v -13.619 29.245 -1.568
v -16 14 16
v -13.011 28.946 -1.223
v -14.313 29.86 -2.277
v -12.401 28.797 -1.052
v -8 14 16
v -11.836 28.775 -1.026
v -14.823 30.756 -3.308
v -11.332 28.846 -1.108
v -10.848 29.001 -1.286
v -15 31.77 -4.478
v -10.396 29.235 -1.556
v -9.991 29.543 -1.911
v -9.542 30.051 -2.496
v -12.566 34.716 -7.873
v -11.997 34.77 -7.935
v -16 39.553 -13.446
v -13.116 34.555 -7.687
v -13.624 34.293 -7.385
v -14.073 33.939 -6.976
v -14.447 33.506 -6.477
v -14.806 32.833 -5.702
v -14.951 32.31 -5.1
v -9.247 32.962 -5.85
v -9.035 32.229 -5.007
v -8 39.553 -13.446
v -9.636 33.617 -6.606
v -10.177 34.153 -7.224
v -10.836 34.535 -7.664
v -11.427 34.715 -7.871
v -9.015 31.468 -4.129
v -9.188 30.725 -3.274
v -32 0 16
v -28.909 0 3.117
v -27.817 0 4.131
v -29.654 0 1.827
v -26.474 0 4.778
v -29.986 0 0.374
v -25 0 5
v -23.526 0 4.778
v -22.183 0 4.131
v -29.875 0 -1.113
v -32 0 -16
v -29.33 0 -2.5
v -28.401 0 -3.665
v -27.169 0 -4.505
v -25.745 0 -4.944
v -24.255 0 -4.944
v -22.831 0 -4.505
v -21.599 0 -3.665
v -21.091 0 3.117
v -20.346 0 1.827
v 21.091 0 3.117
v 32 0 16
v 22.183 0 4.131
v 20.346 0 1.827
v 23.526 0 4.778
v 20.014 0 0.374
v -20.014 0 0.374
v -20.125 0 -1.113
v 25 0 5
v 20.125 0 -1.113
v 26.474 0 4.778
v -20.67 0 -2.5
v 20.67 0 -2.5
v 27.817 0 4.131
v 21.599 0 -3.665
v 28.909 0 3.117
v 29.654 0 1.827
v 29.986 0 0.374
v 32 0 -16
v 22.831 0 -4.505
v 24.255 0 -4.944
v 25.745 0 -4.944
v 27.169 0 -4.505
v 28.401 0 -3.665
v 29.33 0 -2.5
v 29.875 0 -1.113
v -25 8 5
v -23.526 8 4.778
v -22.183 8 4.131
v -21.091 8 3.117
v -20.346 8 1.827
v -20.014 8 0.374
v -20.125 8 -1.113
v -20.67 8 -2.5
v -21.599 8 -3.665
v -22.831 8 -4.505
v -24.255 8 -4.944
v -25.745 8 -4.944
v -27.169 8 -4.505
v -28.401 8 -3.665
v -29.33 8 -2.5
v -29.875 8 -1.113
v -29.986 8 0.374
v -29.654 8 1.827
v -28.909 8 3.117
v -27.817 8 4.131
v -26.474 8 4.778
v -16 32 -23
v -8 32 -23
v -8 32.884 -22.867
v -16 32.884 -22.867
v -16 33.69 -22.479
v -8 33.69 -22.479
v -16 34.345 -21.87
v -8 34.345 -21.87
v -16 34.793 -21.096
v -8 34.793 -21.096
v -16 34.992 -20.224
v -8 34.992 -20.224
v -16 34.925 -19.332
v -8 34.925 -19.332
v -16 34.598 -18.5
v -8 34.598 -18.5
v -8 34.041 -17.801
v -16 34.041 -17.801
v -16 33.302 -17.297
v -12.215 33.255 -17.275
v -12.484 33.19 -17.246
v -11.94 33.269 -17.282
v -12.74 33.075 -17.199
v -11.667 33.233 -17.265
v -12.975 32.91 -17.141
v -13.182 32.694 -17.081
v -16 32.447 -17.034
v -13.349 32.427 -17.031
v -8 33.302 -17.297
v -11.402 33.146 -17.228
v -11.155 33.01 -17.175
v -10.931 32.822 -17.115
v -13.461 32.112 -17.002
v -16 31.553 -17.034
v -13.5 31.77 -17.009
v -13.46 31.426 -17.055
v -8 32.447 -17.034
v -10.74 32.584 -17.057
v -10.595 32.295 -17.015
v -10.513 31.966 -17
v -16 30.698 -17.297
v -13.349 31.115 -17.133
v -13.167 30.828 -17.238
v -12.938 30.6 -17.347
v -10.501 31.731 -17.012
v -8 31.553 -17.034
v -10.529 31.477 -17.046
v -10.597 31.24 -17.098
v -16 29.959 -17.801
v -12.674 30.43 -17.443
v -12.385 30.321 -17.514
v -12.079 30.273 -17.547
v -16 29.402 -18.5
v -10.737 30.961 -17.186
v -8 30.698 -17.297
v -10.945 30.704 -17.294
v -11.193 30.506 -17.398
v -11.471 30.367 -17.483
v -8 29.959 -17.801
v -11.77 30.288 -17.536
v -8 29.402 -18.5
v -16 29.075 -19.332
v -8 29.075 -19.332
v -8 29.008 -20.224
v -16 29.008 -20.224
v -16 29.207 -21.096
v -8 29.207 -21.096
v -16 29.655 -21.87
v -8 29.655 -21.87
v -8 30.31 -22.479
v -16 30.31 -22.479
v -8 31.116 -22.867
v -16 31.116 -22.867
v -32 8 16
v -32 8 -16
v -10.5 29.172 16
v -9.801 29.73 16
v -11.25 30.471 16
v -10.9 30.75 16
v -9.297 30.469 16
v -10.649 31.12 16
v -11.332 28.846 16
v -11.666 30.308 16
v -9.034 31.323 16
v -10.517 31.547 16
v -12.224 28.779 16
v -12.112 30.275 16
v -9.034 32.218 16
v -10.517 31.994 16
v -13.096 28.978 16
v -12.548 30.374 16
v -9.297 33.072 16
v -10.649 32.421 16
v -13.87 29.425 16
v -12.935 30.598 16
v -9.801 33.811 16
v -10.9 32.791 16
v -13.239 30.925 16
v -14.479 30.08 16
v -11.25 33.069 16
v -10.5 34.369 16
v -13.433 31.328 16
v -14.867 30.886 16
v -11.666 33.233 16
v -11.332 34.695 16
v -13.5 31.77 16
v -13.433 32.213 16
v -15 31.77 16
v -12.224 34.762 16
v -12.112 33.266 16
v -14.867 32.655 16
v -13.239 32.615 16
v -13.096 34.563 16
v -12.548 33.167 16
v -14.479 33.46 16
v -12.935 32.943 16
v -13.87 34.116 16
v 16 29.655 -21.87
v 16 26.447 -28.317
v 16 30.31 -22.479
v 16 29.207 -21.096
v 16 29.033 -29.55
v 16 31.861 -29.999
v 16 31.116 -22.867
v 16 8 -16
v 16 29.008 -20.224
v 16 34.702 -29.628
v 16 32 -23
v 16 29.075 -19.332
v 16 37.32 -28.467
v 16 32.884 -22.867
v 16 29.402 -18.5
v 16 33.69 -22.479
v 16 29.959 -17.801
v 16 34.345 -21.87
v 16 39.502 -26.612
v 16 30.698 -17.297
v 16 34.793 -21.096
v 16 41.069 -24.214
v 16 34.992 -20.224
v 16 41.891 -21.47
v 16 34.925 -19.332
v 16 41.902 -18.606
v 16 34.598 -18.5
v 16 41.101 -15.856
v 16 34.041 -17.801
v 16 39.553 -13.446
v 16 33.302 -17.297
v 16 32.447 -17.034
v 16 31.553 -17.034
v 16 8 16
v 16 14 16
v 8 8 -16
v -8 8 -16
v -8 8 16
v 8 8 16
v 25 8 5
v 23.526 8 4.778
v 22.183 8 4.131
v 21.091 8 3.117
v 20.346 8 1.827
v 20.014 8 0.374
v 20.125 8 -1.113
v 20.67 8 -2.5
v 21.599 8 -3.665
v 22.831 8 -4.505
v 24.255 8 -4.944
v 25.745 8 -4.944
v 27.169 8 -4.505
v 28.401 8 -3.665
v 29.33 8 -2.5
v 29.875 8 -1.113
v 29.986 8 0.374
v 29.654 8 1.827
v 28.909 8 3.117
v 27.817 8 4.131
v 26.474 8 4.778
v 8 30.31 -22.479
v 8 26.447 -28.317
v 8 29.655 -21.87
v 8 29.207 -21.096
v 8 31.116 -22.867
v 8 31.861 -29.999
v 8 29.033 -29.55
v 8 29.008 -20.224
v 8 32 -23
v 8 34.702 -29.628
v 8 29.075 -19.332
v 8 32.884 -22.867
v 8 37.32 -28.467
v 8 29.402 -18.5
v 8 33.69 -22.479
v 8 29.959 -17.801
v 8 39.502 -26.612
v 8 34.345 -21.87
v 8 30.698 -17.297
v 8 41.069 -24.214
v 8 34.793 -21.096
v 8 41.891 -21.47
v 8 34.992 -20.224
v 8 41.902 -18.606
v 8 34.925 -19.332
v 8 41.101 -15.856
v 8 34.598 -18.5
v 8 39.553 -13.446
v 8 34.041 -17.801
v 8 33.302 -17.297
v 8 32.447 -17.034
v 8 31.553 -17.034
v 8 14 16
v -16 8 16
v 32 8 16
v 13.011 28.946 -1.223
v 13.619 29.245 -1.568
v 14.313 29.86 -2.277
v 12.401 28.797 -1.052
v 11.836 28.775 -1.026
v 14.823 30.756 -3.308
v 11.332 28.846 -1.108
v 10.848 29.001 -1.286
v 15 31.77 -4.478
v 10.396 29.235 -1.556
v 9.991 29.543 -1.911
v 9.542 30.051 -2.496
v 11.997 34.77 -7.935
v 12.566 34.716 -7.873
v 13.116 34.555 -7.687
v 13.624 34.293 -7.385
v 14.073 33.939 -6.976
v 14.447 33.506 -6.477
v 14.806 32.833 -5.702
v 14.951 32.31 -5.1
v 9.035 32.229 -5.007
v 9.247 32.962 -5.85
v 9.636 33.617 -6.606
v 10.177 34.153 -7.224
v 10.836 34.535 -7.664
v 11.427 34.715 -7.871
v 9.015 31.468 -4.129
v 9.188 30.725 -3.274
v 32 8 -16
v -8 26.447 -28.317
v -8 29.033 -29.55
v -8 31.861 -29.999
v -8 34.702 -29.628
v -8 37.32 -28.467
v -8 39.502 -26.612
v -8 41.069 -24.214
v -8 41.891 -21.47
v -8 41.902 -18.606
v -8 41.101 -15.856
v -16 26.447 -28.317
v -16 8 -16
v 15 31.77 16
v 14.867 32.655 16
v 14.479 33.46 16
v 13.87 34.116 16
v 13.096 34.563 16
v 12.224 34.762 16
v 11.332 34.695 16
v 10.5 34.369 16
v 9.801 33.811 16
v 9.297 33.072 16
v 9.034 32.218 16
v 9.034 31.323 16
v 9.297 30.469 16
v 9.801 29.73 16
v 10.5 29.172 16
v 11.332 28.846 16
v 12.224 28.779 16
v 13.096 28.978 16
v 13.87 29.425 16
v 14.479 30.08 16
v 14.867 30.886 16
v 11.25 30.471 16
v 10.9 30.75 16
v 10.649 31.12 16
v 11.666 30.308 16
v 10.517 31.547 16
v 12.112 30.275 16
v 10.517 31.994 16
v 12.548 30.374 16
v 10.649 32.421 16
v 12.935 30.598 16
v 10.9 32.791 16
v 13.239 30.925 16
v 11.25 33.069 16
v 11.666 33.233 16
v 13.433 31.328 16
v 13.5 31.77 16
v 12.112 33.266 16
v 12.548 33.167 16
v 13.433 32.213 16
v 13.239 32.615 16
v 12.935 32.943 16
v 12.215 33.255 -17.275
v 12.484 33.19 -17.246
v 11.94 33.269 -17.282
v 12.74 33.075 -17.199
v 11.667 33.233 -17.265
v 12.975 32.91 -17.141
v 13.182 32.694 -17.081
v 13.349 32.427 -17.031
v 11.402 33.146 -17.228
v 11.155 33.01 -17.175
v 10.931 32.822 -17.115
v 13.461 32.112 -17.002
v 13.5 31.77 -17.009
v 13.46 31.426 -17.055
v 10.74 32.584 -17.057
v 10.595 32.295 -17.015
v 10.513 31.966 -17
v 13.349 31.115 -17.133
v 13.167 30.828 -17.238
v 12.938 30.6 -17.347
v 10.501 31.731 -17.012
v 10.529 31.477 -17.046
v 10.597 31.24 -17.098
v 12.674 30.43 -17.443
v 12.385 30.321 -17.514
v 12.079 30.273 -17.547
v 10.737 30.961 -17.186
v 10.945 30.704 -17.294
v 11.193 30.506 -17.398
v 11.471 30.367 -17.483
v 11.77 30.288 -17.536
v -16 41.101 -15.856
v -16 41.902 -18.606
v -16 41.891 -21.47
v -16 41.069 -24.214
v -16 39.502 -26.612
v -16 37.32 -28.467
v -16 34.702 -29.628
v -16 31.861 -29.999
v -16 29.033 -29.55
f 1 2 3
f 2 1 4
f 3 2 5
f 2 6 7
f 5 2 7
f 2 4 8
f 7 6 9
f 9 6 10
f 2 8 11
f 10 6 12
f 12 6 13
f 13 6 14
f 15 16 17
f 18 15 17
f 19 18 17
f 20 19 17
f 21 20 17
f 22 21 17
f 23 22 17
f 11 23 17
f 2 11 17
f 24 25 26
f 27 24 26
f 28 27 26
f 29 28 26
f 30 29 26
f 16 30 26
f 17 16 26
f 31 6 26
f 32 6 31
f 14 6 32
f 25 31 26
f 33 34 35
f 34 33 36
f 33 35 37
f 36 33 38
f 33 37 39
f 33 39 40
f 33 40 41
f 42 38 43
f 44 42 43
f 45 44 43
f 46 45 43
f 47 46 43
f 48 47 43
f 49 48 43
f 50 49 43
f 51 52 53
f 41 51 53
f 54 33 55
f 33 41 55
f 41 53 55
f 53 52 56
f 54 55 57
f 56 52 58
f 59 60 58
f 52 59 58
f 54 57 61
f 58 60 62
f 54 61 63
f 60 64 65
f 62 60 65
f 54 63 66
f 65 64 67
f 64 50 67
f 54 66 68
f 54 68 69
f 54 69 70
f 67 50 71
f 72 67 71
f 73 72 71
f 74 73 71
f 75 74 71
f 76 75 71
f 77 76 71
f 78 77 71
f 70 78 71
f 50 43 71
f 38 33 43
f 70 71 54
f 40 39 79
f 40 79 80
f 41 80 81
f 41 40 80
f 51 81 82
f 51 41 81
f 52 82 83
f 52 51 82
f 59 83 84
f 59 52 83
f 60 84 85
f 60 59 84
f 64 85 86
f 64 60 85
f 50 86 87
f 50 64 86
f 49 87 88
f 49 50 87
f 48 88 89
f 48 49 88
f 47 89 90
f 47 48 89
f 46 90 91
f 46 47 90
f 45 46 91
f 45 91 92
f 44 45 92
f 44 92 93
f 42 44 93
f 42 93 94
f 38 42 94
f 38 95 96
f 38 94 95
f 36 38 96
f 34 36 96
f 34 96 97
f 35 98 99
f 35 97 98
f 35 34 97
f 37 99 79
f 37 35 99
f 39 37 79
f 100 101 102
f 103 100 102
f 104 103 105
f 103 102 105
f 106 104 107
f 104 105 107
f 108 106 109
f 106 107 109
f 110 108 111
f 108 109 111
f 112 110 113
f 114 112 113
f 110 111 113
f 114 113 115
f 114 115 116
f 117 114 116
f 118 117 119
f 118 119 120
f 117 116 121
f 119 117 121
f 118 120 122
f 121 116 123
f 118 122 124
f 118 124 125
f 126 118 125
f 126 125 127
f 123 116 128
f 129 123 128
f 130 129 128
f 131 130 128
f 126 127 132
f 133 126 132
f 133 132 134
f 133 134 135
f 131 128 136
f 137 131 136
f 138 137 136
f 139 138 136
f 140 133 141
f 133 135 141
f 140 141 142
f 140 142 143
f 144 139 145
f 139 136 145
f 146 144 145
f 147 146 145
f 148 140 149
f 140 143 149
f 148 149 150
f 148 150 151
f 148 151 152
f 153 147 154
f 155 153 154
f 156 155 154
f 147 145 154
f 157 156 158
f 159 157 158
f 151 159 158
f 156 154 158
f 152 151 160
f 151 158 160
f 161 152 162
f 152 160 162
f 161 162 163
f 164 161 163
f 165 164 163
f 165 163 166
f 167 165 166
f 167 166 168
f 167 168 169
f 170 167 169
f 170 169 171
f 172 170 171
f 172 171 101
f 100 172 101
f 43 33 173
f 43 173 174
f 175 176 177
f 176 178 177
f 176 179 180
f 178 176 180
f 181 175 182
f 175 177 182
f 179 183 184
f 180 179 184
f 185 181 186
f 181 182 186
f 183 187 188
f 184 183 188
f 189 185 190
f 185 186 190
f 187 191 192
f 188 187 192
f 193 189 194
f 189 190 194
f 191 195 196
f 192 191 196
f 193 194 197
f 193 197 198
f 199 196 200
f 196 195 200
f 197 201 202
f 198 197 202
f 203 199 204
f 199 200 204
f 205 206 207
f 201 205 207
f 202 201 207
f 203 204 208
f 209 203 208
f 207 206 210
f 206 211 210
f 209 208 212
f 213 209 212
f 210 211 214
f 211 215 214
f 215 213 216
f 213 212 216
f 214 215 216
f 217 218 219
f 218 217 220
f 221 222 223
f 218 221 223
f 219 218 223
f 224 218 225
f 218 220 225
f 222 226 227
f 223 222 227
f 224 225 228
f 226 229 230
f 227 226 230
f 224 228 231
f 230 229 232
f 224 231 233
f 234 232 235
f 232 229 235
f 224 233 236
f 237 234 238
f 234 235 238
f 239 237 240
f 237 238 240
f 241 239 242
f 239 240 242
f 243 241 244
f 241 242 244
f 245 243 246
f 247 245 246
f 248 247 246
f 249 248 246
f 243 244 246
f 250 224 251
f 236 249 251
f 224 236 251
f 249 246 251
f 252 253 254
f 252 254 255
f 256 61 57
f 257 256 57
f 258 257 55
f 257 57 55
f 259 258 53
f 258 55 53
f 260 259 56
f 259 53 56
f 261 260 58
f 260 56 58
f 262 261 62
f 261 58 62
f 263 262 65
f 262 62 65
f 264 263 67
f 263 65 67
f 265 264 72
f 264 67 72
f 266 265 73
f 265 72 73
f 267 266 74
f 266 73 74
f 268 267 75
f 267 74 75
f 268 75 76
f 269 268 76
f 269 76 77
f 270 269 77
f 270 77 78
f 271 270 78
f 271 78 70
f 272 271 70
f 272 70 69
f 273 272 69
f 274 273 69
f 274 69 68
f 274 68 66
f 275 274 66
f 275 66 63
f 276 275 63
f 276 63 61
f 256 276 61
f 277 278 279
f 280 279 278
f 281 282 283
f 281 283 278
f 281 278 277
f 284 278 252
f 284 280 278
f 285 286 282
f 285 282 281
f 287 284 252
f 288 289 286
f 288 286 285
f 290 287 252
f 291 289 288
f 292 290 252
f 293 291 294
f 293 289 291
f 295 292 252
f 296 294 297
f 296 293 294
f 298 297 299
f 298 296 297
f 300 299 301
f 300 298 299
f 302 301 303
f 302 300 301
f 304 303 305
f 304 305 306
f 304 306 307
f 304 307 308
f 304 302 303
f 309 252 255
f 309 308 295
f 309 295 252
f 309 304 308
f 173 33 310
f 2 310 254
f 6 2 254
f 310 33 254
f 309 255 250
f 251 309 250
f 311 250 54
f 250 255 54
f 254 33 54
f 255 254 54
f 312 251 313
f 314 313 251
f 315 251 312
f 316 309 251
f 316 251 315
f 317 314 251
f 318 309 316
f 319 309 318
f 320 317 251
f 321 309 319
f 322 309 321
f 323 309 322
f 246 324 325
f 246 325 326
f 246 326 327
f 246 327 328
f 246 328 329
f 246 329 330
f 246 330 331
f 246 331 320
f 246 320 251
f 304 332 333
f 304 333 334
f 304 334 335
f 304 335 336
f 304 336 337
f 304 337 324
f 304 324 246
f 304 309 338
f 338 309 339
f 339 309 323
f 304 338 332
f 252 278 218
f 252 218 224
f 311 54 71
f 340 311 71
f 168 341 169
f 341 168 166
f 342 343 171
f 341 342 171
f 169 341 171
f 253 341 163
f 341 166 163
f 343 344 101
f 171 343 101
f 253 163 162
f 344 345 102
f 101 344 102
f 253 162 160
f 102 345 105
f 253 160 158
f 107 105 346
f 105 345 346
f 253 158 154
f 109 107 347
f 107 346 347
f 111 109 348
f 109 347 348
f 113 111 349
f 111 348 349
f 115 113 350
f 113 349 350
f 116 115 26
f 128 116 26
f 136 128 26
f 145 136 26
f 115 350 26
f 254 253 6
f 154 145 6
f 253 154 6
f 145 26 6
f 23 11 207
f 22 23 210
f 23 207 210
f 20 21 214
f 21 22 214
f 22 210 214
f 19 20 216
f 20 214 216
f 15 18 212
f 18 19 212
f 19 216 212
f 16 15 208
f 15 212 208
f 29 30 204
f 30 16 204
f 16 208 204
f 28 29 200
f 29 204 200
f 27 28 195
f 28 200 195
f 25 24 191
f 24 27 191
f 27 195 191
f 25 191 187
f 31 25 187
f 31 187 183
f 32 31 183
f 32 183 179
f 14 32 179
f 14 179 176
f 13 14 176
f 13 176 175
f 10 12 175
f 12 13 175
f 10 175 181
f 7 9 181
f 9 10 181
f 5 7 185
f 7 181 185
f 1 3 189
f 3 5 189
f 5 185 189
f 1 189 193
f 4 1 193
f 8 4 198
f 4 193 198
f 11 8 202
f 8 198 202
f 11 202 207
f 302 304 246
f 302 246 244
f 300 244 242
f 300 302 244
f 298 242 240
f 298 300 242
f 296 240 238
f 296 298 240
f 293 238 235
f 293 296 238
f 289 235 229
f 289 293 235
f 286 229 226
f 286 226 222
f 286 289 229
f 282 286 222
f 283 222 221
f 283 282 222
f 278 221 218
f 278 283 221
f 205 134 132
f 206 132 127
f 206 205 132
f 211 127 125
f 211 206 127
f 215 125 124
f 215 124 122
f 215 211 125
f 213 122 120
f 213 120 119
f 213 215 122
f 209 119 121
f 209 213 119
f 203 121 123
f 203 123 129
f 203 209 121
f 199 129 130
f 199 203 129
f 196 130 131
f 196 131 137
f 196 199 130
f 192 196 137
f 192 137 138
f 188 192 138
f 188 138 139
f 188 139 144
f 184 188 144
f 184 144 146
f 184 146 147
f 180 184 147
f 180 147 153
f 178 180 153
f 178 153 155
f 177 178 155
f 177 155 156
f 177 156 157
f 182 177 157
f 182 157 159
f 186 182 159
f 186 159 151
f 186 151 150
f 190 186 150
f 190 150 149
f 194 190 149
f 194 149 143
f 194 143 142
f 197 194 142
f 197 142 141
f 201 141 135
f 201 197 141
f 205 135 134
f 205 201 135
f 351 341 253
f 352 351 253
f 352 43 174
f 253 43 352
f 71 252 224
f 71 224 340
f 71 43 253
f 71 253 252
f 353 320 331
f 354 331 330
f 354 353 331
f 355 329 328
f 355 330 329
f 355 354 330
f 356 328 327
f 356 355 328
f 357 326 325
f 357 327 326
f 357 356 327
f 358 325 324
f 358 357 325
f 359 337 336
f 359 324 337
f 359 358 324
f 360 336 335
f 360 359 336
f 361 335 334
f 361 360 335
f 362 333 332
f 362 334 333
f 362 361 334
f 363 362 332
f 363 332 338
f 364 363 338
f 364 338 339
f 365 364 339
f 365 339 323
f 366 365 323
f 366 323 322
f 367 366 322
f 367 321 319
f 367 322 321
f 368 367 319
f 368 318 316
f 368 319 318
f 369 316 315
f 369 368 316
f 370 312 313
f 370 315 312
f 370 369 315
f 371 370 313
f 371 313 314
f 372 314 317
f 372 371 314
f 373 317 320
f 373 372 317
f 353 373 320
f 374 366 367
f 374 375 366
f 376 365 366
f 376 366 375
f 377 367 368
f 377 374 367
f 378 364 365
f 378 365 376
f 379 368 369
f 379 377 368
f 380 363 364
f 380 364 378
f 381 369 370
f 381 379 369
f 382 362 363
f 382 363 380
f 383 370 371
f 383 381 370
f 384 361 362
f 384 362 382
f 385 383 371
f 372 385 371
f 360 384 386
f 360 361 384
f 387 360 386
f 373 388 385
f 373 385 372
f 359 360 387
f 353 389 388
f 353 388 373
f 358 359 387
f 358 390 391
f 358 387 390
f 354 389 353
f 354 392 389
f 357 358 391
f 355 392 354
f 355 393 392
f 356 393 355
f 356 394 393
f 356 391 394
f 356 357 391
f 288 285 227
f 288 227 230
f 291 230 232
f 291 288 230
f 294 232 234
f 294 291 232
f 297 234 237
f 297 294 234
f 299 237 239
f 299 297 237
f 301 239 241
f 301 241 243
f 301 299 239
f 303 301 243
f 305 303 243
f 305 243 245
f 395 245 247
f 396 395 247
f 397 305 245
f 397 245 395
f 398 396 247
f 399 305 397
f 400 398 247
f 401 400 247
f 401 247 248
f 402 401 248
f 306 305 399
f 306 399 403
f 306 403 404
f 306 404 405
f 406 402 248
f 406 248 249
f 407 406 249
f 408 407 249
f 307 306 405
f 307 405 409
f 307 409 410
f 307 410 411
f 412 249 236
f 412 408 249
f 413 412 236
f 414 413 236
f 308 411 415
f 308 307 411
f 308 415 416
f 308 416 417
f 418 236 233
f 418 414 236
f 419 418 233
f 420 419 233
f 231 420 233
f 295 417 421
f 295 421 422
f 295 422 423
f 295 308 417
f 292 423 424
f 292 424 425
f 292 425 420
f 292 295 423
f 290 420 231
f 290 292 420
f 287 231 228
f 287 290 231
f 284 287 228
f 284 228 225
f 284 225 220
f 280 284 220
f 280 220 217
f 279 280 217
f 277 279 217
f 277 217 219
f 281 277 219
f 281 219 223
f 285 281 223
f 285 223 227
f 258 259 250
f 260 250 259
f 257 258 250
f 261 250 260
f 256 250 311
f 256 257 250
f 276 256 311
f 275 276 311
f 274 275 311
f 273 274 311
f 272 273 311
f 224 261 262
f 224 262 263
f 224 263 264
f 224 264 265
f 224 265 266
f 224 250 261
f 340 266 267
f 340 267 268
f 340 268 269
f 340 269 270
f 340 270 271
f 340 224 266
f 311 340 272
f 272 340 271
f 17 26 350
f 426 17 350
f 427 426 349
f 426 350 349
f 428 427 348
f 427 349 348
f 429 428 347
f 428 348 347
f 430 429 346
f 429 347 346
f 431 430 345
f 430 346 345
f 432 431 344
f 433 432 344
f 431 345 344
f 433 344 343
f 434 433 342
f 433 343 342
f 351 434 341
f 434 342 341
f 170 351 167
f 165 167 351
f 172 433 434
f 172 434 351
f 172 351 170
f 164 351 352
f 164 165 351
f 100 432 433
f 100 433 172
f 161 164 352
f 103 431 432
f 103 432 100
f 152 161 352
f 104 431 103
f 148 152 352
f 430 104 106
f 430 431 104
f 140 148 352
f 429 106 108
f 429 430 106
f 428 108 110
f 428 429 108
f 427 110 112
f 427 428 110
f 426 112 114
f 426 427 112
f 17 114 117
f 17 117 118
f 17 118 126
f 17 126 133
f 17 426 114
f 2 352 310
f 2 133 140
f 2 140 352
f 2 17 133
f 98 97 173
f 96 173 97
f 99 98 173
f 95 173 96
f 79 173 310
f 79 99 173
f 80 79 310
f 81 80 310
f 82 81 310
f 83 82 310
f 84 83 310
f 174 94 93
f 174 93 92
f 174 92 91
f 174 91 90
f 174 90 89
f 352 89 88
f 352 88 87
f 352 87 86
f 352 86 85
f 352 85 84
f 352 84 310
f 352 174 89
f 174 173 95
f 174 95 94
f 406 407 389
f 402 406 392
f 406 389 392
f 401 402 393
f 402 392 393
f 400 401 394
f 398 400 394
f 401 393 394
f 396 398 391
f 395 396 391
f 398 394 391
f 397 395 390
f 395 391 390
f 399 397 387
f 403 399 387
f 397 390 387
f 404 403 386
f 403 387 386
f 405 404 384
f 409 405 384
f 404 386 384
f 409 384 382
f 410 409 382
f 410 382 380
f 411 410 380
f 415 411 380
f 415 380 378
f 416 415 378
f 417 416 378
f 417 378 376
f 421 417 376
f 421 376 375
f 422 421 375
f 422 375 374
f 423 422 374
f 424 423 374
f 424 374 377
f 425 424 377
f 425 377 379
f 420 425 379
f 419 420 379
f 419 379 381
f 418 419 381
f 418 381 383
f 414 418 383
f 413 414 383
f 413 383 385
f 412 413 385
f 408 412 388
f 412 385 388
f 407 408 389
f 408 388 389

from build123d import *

# Parameters (mm, degrees)
SKETCH_1_W               = 64
SKETCH_1_H               = 32
EXTRUDE_1_DEPTH          = 8
EXTRUDE_START            = 8
SKETCH_2_R               = 3
EXTRUDE_2_DEPTH          = 8
EXTRUDE_3_REACH          = 72.029
SKETCH_3_R               = 3
CUT_EXTRUDE_1_REACH      = 72.029
CUT_EXTRUDE_1_END_RADIUS = 3
SKETCH_4_R               = 1.5
CUT_EXTRUDE_START        = -8
SKETCH_5_R               = 5
CUT_EXTRUDE_3_DEPTH      = 69.728905803


with BuildPart() as part:
    # 草图1 → 凸台-拉伸1 (new body)
    with BuildSketch(Plane(origin=(0, 0, 0), x_dir=(1, 0, 0), z_dir=(0, 1, 0))):
        Rectangle(SKETCH_1_W, SKETCH_1_H)
    extrude(amount=EXTRUDE_1_DEPTH)

    # 草图2 → 凸台-拉伸2 (add)
    with BuildSketch(Plane(origin=(0, 0, 0), x_dir=(0, 0, -1), z_dir=(1, 0, 0)).offset(EXTRUDE_START)):
        with BuildLine():
            Line((-16, 8), (-16, 14))
            Line((-16, 14), (13.44586918, 39.552706084))
            ThreePointArc((13.44586918, 39.552706084), (26.611734227, 39.502331005), (28.316651221, 26.447224796))
            Line((28.316651221, 26.447224796), (16, 8))
            Line((16, 8), (-16, 8))
        make_face()
        with Locations((20, 32)):
            Circle(SKETCH_2_R, mode=Mode.SUBTRACT)
    extrude_2 = extrude(amount=EXTRUDE_2_DEPTH)

    # 凸台-拉伸3: up to this plane
    extrude_3_end = Plane(origin=(16, 14, 16), z_dir=(0, -0.7552706084274633, -0.6554130819915097))
    # 草图3 → 凸台-拉伸3 (add, up to the surface)
    with BuildSketch(Plane.XY.offset(16), mode=Mode.PRIVATE) as extrude_3_sk1:
        with Locations((12, 31.770444903)):
            Circle(SKETCH_3_R)
    extrude_3_tool1 = split(extrude(extrude_3_sk1.sketch, amount=-EXTRUDE_3_REACH, mode=Mode.PRIVATE), bisect_by=extrude_3_end, keep=Keep.BOTH, mode=Mode.PRIVATE)
    extrude_3 = extrude_3_tool1.solids().sort_by_distance((12, 31.770445, 16))[0]
    add(extrude_3)

    # 切除-拉伸1: up to this cylinder (the profile starts outside it)
    cut_extrude_1_end = Plane(origin=(12, 32, -20), z_dir=(-1, 0, 0)) * Cylinder(CUT_EXTRUDE_1_END_RADIUS, 151.058, mode=Mode.PRIVATE)
    # 草图4 → 切除-拉伸1 (cut, up to the surface)
    with BuildSketch(Plane.XY.offset(16), mode=Mode.PRIVATE) as cut_extrude_1_sk1:
        with Locations((12, 31.770444903)):
            Circle(SKETCH_4_R)
    cut_extrude_1_tool1 = extrude(cut_extrude_1_sk1.sketch, amount=-CUT_EXTRUDE_1_REACH, mode=Mode.PRIVATE) - cut_extrude_1_end
    cut_extrude_1 = cut_extrude_1_tool1.solids().sort_by_distance((12, 31.770445, 16))[0]
    add(cut_extrude_1, mode=Mode.SUBTRACT)

    # 镜向1: 凸台-拉伸2, 凸台-拉伸3, 切除-拉伸1 across plane
    add(extrude_2.mirror(Plane(origin=(0, 0, 0), x_dir=(0, 0, 1), z_dir=(1, 0, 0))))
    add(extrude_3.mirror(Plane(origin=(0, 0, 0), x_dir=(0, 0, 1), z_dir=(1, 0, 0))))
    add(cut_extrude_1.mirror(Plane(origin=(0, 0, 0), x_dir=(0, 0, 1), z_dir=(1, 0, 0))), mode=Mode.SUBTRACT)

    # 草图5 → 切除-拉伸3 (cut)
    with BuildSketch(Plane(origin=(0, 0, 0), x_dir=(1, 0, 0), z_dir=(0, 1, 0)).offset(CUT_EXTRUDE_START)):
        with Locations(Location((-25, 0, 0), (0, 0, 270))):
            Circle(SKETCH_5_R)
    cut_extrude_3 = extrude(amount=CUT_EXTRUDE_3_DEPTH, mode=Mode.SUBTRACT)

    # 镜向2: 切除-拉伸3 across plane
    add(cut_extrude_3.mirror(Plane(origin=(0, 0, 0), x_dir=(0, 0, 1), z_dir=(1, 0, 0))), mode=Mode.SUBTRACT)


solid = part.part
